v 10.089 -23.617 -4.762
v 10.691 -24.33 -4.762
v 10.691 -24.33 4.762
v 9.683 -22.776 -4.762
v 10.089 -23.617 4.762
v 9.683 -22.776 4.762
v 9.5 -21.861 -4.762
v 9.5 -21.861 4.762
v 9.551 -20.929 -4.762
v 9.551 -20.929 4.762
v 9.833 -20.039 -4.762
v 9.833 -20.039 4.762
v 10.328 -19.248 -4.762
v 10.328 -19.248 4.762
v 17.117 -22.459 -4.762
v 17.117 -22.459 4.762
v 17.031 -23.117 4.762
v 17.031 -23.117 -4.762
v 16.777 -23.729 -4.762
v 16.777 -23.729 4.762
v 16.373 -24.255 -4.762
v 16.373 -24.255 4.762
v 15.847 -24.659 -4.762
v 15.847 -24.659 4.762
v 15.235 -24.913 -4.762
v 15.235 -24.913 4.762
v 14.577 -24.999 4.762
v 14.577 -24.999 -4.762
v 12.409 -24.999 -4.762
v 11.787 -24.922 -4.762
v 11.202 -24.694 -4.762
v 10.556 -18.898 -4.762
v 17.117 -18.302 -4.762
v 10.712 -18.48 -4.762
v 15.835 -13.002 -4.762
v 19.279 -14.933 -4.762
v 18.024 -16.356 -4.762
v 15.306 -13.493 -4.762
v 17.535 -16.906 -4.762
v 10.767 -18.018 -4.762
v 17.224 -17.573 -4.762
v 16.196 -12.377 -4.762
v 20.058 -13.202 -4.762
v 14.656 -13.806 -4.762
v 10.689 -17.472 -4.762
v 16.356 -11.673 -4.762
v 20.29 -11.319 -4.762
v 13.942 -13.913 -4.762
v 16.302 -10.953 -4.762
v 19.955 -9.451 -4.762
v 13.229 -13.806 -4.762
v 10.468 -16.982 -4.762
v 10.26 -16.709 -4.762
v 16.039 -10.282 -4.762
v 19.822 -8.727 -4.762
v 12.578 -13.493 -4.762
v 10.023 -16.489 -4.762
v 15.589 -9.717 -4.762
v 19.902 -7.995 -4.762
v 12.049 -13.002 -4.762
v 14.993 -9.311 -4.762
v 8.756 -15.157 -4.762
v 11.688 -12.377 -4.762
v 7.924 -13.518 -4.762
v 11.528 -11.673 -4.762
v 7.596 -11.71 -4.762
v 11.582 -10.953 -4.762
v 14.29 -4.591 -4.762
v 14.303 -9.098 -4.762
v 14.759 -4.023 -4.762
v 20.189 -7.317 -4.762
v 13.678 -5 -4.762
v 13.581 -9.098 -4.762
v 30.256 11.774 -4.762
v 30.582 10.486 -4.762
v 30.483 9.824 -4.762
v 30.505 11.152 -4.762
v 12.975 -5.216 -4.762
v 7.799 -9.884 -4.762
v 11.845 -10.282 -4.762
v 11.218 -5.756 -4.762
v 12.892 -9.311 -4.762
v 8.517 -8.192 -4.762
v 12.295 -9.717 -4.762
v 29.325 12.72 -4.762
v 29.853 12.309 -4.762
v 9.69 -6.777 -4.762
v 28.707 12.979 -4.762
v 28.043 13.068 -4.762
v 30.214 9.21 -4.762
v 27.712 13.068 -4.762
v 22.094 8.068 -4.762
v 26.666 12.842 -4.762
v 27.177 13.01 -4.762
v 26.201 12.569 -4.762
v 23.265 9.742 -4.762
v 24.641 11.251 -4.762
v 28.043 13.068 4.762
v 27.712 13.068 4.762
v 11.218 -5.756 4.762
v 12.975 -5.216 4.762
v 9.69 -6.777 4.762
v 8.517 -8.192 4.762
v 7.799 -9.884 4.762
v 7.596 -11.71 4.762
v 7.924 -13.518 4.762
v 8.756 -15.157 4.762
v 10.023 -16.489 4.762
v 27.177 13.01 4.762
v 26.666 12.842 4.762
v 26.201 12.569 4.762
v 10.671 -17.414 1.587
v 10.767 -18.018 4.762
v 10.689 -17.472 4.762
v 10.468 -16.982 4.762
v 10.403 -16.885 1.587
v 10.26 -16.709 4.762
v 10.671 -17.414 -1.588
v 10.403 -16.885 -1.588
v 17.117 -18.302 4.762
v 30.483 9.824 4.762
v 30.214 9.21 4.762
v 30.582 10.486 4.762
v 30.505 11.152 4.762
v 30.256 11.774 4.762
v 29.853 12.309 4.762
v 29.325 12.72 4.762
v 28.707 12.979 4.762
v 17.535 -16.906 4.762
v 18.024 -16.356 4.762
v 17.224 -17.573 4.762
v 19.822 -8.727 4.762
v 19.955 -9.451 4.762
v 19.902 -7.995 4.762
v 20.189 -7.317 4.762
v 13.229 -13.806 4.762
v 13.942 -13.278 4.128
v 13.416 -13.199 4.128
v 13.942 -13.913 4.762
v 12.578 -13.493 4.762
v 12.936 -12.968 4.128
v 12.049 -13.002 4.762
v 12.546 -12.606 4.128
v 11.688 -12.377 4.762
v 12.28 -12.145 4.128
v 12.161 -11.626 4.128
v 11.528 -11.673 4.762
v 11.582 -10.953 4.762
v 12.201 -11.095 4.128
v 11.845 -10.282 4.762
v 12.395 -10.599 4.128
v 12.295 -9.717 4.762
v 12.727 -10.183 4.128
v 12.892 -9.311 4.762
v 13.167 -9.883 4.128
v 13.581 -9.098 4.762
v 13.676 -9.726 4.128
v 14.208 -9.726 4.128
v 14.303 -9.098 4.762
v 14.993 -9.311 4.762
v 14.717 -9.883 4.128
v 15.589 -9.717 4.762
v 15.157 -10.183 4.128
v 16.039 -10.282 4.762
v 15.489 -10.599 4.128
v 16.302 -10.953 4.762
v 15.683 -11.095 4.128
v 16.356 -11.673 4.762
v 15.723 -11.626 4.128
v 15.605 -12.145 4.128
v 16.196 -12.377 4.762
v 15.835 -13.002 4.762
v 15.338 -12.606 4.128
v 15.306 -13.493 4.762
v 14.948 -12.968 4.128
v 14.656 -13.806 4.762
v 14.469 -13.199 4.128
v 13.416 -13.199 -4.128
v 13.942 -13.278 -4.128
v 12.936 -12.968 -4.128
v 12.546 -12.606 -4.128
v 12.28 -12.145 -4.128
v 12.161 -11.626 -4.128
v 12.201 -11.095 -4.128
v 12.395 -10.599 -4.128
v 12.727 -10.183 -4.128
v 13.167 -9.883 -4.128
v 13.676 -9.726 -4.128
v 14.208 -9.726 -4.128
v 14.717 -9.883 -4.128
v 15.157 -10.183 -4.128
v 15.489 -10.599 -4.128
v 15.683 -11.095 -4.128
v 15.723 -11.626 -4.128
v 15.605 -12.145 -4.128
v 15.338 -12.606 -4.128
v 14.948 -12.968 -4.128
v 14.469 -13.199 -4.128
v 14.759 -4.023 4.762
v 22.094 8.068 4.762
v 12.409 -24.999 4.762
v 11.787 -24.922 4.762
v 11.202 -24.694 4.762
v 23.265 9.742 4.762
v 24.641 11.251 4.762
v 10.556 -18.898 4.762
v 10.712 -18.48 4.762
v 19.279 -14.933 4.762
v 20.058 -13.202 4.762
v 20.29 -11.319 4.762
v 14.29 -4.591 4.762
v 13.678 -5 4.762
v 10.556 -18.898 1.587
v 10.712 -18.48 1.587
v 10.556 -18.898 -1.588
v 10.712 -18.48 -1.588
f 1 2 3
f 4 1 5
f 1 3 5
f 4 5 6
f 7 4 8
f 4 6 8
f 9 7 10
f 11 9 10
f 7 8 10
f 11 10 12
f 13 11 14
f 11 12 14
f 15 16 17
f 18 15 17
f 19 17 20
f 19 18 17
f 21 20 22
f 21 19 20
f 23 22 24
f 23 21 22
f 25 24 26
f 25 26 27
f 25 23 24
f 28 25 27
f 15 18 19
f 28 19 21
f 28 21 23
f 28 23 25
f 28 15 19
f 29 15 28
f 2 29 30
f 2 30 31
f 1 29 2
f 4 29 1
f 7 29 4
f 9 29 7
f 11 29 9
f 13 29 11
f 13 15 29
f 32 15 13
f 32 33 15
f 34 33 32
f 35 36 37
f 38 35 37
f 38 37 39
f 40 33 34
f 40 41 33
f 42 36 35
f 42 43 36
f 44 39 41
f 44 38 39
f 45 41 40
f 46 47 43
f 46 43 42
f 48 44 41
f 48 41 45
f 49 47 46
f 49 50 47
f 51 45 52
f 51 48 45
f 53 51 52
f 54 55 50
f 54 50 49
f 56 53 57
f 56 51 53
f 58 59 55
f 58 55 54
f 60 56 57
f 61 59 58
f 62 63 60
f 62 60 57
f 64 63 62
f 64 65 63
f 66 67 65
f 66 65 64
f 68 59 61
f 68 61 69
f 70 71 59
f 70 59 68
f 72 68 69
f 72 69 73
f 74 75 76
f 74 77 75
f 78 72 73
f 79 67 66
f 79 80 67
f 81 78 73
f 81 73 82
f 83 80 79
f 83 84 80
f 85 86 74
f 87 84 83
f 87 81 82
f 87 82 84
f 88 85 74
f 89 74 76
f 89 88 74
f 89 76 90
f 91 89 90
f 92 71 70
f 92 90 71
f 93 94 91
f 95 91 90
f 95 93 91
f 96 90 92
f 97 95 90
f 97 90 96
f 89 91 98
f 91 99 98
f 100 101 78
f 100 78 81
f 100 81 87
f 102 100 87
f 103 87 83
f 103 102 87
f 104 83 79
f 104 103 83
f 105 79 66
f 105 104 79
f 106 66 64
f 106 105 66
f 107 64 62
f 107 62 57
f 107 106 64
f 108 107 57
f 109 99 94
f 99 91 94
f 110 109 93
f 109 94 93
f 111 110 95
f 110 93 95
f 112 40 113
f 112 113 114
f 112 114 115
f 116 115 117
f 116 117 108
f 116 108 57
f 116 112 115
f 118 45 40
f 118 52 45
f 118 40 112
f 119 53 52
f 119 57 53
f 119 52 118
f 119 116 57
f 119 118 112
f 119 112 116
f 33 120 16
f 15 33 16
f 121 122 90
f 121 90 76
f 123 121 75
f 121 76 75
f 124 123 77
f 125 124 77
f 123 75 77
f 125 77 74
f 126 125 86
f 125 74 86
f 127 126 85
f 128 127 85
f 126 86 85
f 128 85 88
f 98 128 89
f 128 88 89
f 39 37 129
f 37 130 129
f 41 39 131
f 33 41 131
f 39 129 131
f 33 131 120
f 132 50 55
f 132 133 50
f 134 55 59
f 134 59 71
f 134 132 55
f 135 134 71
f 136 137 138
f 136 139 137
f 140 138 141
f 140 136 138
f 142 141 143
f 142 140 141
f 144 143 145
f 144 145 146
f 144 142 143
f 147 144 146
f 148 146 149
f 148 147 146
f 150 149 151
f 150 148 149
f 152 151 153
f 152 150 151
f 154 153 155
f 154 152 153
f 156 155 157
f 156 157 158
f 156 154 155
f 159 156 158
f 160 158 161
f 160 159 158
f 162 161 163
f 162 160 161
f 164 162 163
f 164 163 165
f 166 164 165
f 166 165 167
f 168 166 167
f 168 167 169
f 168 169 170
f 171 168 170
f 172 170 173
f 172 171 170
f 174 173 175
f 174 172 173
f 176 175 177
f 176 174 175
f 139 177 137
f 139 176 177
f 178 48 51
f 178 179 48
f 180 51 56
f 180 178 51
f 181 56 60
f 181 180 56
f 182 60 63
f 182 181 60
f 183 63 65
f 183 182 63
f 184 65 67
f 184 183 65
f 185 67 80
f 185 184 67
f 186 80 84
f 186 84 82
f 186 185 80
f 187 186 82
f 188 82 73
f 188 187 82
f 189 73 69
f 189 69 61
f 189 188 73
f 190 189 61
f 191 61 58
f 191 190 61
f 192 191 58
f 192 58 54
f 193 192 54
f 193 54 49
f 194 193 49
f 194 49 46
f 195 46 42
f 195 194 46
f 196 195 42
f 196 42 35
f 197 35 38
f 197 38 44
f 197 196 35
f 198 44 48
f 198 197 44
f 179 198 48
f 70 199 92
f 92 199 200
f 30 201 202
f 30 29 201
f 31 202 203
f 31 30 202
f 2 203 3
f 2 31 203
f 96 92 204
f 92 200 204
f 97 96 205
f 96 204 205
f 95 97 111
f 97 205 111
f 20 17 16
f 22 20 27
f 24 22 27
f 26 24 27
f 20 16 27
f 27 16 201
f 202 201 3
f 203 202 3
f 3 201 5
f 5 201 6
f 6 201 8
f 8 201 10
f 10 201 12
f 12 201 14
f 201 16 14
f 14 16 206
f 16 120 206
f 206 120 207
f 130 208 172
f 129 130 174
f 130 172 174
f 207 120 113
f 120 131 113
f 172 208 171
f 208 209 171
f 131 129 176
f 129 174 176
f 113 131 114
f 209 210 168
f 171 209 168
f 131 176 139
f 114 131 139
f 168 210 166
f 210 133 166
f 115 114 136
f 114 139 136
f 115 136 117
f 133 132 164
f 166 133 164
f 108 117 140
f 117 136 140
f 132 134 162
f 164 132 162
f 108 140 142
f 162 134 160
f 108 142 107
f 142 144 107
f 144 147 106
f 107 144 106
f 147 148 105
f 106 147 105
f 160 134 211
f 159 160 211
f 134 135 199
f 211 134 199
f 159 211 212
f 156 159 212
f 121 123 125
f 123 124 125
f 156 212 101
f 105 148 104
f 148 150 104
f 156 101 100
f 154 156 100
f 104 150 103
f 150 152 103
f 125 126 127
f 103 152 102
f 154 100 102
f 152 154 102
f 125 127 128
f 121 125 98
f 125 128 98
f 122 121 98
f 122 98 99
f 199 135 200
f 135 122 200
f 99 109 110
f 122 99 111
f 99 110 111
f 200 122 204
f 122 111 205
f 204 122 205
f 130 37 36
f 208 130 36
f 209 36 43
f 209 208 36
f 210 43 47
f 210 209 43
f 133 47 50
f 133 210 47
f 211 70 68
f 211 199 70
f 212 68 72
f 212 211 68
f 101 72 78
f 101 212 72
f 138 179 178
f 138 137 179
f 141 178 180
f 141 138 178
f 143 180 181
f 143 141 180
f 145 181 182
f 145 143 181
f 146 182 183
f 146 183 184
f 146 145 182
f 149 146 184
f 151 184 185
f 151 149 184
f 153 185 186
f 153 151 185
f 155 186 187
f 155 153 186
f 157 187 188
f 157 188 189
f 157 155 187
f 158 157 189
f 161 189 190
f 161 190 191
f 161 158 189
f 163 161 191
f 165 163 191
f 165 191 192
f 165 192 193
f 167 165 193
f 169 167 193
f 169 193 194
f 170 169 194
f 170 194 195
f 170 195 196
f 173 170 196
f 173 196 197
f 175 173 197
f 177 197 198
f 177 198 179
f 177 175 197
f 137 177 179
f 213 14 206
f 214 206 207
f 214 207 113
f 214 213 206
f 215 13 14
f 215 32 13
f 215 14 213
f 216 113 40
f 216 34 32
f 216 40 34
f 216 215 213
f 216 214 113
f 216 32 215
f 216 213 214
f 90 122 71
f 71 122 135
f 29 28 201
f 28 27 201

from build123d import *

# Parameters (mm, degrees)
BOSS_EXTRUDE1_DEPTH = 4.7625
SKETCH2_R           = 6.35
BOSS_EXTRUDE2_DEPTH = 9.525
FILLET1_R           = 2.54
FILLET2_START       = -4.7625
FILLET2_DEPTH       = 9.525


with BuildPart() as part:
    # Sketch1 → Boss-Extrude1 (new, symmetric)
    with BuildSketch(Plane.XY):
        with BuildLine():
            ThreePointArc((22.094337813, 8.067740847), (24.226136754, 10.836108919), (26.914852205, 13.067529481))
            Line((26.914852205, 13.067529481), (32.554450869, 13.067529481))
            Line((32.554450869, 13.067529481), (17.117145822, -12.379943283))
            Line((17.117145822, -12.379943283), (17.117145822, -24.9994))
            Line((17.117145822, -24.9994), (11.719856102, -24.9994))
            ThreePointArc((11.719856102, -24.9994), (9.533586303, -22.160148794), (10.767145822, -18.795709173))
            Line((10.767145822, -18.795709173), (10.767145822, -10.604456717))
            Line((10.767145822, -10.604456717), (22.094337813, 8.067740847))
        make_face()
    extrude(amount=BOSS_EXTRUDE1_DEPTH, both=True)

    # Sketch2 → Boss-Extrude2 (add, through all)
    with BuildSketch(Plane.XY.offset(4.7625)):
        with Locations((13.942145822, -11.4922)):
            Circle(SKETCH2_R)
    extrude(amount=-BOSS_EXTRUDE2_DEPTH)

    # Sketch3 → 9/64 (0.14063) Diameter Hole1 (revolve, cut)
    with BuildSketch(Plane(origin=(13.942145822, -11.4922, 4.7625), x_dir=(0, -1, 0), z_dir=(1, 0, 0))):
        Polygon((0, 0), (0, 9.525), (2.421001, 9.525), (1.786001, 8.89), (1.786001, 0.635), (2.421001, 0), align=None)
    revolve(axis=Axis((13.942145822, -11.4922, 11.1125), (0, 0, -1)), mode=Mode.SUBTRACT)

    # Fillet1
    fillet1_edges = [part.edges().sort_by_distance(p)[0] for p in [
        (26.914852205, 13.067529481, 0),
        (32.554450869, 13.067529481, 0),
        (17.117145822, -24.9994, 0),
        (11.719856102, -24.9994, 0),
        (14.079831445, -5.143692879, 0),
        (17.117145822, -16.991461314, 0),
        (19.508957077, -8.437185686, 0),
    ]]
    fillet(fillet1_edges, radius=FILLET1_R)

    # Fillet2: read off the stored shape, not the designer's step
    # Fillet2 outline → Fillet2 (add)
    with BuildSketch(Plane.XY.offset(FILLET2_START)):
        with BuildLine():
            add(Edge.make_bspline(
                [(10.767145822, -18.017877519), (10.767145823, -17.393004157), (10.487472268, -16.852808402), (10.023052756, -16.488519599)],
                knots=[0.43435667, 0.43435667, 0.43435667, 0.43435667, 1, 1, 1, 1], degree=3, weights=[0.852569416, 0.837715519, 0.886859046, 1]))
            Line((10.767145822, -18.017877519), (10.767145822, -16.991461314))
            ThreePointArc((10.767145822, -16.991461314), (10.386196343, -16.753162203), (10.023052756, -16.488519599))
        make_face()
        with BuildLine():
            add(Edge.make_bspline(
                [(10.328377861, -19.24798429), (10.606973983, -18.907141934), (10.767145822, -18.483132326), (10.767145822, -18.017877519)],
                knots=[0, 0, 0, 0, 0.43435667, 0.43435667, 0.43435667, 0.43435667], degree=3, weights=[1, 0.91311923, 0.863975702, 0.852569416]))
            ThreePointArc((10.328377861, -19.24798429), (10.538145849, -19.01251792), (10.767145822, -18.795709173))
            Line((10.767145822, -18.795709173), (10.767145822, -18.017877519))
        make_face()
    extrude(amount=FILLET2_DEPTH)


solid = part.part
